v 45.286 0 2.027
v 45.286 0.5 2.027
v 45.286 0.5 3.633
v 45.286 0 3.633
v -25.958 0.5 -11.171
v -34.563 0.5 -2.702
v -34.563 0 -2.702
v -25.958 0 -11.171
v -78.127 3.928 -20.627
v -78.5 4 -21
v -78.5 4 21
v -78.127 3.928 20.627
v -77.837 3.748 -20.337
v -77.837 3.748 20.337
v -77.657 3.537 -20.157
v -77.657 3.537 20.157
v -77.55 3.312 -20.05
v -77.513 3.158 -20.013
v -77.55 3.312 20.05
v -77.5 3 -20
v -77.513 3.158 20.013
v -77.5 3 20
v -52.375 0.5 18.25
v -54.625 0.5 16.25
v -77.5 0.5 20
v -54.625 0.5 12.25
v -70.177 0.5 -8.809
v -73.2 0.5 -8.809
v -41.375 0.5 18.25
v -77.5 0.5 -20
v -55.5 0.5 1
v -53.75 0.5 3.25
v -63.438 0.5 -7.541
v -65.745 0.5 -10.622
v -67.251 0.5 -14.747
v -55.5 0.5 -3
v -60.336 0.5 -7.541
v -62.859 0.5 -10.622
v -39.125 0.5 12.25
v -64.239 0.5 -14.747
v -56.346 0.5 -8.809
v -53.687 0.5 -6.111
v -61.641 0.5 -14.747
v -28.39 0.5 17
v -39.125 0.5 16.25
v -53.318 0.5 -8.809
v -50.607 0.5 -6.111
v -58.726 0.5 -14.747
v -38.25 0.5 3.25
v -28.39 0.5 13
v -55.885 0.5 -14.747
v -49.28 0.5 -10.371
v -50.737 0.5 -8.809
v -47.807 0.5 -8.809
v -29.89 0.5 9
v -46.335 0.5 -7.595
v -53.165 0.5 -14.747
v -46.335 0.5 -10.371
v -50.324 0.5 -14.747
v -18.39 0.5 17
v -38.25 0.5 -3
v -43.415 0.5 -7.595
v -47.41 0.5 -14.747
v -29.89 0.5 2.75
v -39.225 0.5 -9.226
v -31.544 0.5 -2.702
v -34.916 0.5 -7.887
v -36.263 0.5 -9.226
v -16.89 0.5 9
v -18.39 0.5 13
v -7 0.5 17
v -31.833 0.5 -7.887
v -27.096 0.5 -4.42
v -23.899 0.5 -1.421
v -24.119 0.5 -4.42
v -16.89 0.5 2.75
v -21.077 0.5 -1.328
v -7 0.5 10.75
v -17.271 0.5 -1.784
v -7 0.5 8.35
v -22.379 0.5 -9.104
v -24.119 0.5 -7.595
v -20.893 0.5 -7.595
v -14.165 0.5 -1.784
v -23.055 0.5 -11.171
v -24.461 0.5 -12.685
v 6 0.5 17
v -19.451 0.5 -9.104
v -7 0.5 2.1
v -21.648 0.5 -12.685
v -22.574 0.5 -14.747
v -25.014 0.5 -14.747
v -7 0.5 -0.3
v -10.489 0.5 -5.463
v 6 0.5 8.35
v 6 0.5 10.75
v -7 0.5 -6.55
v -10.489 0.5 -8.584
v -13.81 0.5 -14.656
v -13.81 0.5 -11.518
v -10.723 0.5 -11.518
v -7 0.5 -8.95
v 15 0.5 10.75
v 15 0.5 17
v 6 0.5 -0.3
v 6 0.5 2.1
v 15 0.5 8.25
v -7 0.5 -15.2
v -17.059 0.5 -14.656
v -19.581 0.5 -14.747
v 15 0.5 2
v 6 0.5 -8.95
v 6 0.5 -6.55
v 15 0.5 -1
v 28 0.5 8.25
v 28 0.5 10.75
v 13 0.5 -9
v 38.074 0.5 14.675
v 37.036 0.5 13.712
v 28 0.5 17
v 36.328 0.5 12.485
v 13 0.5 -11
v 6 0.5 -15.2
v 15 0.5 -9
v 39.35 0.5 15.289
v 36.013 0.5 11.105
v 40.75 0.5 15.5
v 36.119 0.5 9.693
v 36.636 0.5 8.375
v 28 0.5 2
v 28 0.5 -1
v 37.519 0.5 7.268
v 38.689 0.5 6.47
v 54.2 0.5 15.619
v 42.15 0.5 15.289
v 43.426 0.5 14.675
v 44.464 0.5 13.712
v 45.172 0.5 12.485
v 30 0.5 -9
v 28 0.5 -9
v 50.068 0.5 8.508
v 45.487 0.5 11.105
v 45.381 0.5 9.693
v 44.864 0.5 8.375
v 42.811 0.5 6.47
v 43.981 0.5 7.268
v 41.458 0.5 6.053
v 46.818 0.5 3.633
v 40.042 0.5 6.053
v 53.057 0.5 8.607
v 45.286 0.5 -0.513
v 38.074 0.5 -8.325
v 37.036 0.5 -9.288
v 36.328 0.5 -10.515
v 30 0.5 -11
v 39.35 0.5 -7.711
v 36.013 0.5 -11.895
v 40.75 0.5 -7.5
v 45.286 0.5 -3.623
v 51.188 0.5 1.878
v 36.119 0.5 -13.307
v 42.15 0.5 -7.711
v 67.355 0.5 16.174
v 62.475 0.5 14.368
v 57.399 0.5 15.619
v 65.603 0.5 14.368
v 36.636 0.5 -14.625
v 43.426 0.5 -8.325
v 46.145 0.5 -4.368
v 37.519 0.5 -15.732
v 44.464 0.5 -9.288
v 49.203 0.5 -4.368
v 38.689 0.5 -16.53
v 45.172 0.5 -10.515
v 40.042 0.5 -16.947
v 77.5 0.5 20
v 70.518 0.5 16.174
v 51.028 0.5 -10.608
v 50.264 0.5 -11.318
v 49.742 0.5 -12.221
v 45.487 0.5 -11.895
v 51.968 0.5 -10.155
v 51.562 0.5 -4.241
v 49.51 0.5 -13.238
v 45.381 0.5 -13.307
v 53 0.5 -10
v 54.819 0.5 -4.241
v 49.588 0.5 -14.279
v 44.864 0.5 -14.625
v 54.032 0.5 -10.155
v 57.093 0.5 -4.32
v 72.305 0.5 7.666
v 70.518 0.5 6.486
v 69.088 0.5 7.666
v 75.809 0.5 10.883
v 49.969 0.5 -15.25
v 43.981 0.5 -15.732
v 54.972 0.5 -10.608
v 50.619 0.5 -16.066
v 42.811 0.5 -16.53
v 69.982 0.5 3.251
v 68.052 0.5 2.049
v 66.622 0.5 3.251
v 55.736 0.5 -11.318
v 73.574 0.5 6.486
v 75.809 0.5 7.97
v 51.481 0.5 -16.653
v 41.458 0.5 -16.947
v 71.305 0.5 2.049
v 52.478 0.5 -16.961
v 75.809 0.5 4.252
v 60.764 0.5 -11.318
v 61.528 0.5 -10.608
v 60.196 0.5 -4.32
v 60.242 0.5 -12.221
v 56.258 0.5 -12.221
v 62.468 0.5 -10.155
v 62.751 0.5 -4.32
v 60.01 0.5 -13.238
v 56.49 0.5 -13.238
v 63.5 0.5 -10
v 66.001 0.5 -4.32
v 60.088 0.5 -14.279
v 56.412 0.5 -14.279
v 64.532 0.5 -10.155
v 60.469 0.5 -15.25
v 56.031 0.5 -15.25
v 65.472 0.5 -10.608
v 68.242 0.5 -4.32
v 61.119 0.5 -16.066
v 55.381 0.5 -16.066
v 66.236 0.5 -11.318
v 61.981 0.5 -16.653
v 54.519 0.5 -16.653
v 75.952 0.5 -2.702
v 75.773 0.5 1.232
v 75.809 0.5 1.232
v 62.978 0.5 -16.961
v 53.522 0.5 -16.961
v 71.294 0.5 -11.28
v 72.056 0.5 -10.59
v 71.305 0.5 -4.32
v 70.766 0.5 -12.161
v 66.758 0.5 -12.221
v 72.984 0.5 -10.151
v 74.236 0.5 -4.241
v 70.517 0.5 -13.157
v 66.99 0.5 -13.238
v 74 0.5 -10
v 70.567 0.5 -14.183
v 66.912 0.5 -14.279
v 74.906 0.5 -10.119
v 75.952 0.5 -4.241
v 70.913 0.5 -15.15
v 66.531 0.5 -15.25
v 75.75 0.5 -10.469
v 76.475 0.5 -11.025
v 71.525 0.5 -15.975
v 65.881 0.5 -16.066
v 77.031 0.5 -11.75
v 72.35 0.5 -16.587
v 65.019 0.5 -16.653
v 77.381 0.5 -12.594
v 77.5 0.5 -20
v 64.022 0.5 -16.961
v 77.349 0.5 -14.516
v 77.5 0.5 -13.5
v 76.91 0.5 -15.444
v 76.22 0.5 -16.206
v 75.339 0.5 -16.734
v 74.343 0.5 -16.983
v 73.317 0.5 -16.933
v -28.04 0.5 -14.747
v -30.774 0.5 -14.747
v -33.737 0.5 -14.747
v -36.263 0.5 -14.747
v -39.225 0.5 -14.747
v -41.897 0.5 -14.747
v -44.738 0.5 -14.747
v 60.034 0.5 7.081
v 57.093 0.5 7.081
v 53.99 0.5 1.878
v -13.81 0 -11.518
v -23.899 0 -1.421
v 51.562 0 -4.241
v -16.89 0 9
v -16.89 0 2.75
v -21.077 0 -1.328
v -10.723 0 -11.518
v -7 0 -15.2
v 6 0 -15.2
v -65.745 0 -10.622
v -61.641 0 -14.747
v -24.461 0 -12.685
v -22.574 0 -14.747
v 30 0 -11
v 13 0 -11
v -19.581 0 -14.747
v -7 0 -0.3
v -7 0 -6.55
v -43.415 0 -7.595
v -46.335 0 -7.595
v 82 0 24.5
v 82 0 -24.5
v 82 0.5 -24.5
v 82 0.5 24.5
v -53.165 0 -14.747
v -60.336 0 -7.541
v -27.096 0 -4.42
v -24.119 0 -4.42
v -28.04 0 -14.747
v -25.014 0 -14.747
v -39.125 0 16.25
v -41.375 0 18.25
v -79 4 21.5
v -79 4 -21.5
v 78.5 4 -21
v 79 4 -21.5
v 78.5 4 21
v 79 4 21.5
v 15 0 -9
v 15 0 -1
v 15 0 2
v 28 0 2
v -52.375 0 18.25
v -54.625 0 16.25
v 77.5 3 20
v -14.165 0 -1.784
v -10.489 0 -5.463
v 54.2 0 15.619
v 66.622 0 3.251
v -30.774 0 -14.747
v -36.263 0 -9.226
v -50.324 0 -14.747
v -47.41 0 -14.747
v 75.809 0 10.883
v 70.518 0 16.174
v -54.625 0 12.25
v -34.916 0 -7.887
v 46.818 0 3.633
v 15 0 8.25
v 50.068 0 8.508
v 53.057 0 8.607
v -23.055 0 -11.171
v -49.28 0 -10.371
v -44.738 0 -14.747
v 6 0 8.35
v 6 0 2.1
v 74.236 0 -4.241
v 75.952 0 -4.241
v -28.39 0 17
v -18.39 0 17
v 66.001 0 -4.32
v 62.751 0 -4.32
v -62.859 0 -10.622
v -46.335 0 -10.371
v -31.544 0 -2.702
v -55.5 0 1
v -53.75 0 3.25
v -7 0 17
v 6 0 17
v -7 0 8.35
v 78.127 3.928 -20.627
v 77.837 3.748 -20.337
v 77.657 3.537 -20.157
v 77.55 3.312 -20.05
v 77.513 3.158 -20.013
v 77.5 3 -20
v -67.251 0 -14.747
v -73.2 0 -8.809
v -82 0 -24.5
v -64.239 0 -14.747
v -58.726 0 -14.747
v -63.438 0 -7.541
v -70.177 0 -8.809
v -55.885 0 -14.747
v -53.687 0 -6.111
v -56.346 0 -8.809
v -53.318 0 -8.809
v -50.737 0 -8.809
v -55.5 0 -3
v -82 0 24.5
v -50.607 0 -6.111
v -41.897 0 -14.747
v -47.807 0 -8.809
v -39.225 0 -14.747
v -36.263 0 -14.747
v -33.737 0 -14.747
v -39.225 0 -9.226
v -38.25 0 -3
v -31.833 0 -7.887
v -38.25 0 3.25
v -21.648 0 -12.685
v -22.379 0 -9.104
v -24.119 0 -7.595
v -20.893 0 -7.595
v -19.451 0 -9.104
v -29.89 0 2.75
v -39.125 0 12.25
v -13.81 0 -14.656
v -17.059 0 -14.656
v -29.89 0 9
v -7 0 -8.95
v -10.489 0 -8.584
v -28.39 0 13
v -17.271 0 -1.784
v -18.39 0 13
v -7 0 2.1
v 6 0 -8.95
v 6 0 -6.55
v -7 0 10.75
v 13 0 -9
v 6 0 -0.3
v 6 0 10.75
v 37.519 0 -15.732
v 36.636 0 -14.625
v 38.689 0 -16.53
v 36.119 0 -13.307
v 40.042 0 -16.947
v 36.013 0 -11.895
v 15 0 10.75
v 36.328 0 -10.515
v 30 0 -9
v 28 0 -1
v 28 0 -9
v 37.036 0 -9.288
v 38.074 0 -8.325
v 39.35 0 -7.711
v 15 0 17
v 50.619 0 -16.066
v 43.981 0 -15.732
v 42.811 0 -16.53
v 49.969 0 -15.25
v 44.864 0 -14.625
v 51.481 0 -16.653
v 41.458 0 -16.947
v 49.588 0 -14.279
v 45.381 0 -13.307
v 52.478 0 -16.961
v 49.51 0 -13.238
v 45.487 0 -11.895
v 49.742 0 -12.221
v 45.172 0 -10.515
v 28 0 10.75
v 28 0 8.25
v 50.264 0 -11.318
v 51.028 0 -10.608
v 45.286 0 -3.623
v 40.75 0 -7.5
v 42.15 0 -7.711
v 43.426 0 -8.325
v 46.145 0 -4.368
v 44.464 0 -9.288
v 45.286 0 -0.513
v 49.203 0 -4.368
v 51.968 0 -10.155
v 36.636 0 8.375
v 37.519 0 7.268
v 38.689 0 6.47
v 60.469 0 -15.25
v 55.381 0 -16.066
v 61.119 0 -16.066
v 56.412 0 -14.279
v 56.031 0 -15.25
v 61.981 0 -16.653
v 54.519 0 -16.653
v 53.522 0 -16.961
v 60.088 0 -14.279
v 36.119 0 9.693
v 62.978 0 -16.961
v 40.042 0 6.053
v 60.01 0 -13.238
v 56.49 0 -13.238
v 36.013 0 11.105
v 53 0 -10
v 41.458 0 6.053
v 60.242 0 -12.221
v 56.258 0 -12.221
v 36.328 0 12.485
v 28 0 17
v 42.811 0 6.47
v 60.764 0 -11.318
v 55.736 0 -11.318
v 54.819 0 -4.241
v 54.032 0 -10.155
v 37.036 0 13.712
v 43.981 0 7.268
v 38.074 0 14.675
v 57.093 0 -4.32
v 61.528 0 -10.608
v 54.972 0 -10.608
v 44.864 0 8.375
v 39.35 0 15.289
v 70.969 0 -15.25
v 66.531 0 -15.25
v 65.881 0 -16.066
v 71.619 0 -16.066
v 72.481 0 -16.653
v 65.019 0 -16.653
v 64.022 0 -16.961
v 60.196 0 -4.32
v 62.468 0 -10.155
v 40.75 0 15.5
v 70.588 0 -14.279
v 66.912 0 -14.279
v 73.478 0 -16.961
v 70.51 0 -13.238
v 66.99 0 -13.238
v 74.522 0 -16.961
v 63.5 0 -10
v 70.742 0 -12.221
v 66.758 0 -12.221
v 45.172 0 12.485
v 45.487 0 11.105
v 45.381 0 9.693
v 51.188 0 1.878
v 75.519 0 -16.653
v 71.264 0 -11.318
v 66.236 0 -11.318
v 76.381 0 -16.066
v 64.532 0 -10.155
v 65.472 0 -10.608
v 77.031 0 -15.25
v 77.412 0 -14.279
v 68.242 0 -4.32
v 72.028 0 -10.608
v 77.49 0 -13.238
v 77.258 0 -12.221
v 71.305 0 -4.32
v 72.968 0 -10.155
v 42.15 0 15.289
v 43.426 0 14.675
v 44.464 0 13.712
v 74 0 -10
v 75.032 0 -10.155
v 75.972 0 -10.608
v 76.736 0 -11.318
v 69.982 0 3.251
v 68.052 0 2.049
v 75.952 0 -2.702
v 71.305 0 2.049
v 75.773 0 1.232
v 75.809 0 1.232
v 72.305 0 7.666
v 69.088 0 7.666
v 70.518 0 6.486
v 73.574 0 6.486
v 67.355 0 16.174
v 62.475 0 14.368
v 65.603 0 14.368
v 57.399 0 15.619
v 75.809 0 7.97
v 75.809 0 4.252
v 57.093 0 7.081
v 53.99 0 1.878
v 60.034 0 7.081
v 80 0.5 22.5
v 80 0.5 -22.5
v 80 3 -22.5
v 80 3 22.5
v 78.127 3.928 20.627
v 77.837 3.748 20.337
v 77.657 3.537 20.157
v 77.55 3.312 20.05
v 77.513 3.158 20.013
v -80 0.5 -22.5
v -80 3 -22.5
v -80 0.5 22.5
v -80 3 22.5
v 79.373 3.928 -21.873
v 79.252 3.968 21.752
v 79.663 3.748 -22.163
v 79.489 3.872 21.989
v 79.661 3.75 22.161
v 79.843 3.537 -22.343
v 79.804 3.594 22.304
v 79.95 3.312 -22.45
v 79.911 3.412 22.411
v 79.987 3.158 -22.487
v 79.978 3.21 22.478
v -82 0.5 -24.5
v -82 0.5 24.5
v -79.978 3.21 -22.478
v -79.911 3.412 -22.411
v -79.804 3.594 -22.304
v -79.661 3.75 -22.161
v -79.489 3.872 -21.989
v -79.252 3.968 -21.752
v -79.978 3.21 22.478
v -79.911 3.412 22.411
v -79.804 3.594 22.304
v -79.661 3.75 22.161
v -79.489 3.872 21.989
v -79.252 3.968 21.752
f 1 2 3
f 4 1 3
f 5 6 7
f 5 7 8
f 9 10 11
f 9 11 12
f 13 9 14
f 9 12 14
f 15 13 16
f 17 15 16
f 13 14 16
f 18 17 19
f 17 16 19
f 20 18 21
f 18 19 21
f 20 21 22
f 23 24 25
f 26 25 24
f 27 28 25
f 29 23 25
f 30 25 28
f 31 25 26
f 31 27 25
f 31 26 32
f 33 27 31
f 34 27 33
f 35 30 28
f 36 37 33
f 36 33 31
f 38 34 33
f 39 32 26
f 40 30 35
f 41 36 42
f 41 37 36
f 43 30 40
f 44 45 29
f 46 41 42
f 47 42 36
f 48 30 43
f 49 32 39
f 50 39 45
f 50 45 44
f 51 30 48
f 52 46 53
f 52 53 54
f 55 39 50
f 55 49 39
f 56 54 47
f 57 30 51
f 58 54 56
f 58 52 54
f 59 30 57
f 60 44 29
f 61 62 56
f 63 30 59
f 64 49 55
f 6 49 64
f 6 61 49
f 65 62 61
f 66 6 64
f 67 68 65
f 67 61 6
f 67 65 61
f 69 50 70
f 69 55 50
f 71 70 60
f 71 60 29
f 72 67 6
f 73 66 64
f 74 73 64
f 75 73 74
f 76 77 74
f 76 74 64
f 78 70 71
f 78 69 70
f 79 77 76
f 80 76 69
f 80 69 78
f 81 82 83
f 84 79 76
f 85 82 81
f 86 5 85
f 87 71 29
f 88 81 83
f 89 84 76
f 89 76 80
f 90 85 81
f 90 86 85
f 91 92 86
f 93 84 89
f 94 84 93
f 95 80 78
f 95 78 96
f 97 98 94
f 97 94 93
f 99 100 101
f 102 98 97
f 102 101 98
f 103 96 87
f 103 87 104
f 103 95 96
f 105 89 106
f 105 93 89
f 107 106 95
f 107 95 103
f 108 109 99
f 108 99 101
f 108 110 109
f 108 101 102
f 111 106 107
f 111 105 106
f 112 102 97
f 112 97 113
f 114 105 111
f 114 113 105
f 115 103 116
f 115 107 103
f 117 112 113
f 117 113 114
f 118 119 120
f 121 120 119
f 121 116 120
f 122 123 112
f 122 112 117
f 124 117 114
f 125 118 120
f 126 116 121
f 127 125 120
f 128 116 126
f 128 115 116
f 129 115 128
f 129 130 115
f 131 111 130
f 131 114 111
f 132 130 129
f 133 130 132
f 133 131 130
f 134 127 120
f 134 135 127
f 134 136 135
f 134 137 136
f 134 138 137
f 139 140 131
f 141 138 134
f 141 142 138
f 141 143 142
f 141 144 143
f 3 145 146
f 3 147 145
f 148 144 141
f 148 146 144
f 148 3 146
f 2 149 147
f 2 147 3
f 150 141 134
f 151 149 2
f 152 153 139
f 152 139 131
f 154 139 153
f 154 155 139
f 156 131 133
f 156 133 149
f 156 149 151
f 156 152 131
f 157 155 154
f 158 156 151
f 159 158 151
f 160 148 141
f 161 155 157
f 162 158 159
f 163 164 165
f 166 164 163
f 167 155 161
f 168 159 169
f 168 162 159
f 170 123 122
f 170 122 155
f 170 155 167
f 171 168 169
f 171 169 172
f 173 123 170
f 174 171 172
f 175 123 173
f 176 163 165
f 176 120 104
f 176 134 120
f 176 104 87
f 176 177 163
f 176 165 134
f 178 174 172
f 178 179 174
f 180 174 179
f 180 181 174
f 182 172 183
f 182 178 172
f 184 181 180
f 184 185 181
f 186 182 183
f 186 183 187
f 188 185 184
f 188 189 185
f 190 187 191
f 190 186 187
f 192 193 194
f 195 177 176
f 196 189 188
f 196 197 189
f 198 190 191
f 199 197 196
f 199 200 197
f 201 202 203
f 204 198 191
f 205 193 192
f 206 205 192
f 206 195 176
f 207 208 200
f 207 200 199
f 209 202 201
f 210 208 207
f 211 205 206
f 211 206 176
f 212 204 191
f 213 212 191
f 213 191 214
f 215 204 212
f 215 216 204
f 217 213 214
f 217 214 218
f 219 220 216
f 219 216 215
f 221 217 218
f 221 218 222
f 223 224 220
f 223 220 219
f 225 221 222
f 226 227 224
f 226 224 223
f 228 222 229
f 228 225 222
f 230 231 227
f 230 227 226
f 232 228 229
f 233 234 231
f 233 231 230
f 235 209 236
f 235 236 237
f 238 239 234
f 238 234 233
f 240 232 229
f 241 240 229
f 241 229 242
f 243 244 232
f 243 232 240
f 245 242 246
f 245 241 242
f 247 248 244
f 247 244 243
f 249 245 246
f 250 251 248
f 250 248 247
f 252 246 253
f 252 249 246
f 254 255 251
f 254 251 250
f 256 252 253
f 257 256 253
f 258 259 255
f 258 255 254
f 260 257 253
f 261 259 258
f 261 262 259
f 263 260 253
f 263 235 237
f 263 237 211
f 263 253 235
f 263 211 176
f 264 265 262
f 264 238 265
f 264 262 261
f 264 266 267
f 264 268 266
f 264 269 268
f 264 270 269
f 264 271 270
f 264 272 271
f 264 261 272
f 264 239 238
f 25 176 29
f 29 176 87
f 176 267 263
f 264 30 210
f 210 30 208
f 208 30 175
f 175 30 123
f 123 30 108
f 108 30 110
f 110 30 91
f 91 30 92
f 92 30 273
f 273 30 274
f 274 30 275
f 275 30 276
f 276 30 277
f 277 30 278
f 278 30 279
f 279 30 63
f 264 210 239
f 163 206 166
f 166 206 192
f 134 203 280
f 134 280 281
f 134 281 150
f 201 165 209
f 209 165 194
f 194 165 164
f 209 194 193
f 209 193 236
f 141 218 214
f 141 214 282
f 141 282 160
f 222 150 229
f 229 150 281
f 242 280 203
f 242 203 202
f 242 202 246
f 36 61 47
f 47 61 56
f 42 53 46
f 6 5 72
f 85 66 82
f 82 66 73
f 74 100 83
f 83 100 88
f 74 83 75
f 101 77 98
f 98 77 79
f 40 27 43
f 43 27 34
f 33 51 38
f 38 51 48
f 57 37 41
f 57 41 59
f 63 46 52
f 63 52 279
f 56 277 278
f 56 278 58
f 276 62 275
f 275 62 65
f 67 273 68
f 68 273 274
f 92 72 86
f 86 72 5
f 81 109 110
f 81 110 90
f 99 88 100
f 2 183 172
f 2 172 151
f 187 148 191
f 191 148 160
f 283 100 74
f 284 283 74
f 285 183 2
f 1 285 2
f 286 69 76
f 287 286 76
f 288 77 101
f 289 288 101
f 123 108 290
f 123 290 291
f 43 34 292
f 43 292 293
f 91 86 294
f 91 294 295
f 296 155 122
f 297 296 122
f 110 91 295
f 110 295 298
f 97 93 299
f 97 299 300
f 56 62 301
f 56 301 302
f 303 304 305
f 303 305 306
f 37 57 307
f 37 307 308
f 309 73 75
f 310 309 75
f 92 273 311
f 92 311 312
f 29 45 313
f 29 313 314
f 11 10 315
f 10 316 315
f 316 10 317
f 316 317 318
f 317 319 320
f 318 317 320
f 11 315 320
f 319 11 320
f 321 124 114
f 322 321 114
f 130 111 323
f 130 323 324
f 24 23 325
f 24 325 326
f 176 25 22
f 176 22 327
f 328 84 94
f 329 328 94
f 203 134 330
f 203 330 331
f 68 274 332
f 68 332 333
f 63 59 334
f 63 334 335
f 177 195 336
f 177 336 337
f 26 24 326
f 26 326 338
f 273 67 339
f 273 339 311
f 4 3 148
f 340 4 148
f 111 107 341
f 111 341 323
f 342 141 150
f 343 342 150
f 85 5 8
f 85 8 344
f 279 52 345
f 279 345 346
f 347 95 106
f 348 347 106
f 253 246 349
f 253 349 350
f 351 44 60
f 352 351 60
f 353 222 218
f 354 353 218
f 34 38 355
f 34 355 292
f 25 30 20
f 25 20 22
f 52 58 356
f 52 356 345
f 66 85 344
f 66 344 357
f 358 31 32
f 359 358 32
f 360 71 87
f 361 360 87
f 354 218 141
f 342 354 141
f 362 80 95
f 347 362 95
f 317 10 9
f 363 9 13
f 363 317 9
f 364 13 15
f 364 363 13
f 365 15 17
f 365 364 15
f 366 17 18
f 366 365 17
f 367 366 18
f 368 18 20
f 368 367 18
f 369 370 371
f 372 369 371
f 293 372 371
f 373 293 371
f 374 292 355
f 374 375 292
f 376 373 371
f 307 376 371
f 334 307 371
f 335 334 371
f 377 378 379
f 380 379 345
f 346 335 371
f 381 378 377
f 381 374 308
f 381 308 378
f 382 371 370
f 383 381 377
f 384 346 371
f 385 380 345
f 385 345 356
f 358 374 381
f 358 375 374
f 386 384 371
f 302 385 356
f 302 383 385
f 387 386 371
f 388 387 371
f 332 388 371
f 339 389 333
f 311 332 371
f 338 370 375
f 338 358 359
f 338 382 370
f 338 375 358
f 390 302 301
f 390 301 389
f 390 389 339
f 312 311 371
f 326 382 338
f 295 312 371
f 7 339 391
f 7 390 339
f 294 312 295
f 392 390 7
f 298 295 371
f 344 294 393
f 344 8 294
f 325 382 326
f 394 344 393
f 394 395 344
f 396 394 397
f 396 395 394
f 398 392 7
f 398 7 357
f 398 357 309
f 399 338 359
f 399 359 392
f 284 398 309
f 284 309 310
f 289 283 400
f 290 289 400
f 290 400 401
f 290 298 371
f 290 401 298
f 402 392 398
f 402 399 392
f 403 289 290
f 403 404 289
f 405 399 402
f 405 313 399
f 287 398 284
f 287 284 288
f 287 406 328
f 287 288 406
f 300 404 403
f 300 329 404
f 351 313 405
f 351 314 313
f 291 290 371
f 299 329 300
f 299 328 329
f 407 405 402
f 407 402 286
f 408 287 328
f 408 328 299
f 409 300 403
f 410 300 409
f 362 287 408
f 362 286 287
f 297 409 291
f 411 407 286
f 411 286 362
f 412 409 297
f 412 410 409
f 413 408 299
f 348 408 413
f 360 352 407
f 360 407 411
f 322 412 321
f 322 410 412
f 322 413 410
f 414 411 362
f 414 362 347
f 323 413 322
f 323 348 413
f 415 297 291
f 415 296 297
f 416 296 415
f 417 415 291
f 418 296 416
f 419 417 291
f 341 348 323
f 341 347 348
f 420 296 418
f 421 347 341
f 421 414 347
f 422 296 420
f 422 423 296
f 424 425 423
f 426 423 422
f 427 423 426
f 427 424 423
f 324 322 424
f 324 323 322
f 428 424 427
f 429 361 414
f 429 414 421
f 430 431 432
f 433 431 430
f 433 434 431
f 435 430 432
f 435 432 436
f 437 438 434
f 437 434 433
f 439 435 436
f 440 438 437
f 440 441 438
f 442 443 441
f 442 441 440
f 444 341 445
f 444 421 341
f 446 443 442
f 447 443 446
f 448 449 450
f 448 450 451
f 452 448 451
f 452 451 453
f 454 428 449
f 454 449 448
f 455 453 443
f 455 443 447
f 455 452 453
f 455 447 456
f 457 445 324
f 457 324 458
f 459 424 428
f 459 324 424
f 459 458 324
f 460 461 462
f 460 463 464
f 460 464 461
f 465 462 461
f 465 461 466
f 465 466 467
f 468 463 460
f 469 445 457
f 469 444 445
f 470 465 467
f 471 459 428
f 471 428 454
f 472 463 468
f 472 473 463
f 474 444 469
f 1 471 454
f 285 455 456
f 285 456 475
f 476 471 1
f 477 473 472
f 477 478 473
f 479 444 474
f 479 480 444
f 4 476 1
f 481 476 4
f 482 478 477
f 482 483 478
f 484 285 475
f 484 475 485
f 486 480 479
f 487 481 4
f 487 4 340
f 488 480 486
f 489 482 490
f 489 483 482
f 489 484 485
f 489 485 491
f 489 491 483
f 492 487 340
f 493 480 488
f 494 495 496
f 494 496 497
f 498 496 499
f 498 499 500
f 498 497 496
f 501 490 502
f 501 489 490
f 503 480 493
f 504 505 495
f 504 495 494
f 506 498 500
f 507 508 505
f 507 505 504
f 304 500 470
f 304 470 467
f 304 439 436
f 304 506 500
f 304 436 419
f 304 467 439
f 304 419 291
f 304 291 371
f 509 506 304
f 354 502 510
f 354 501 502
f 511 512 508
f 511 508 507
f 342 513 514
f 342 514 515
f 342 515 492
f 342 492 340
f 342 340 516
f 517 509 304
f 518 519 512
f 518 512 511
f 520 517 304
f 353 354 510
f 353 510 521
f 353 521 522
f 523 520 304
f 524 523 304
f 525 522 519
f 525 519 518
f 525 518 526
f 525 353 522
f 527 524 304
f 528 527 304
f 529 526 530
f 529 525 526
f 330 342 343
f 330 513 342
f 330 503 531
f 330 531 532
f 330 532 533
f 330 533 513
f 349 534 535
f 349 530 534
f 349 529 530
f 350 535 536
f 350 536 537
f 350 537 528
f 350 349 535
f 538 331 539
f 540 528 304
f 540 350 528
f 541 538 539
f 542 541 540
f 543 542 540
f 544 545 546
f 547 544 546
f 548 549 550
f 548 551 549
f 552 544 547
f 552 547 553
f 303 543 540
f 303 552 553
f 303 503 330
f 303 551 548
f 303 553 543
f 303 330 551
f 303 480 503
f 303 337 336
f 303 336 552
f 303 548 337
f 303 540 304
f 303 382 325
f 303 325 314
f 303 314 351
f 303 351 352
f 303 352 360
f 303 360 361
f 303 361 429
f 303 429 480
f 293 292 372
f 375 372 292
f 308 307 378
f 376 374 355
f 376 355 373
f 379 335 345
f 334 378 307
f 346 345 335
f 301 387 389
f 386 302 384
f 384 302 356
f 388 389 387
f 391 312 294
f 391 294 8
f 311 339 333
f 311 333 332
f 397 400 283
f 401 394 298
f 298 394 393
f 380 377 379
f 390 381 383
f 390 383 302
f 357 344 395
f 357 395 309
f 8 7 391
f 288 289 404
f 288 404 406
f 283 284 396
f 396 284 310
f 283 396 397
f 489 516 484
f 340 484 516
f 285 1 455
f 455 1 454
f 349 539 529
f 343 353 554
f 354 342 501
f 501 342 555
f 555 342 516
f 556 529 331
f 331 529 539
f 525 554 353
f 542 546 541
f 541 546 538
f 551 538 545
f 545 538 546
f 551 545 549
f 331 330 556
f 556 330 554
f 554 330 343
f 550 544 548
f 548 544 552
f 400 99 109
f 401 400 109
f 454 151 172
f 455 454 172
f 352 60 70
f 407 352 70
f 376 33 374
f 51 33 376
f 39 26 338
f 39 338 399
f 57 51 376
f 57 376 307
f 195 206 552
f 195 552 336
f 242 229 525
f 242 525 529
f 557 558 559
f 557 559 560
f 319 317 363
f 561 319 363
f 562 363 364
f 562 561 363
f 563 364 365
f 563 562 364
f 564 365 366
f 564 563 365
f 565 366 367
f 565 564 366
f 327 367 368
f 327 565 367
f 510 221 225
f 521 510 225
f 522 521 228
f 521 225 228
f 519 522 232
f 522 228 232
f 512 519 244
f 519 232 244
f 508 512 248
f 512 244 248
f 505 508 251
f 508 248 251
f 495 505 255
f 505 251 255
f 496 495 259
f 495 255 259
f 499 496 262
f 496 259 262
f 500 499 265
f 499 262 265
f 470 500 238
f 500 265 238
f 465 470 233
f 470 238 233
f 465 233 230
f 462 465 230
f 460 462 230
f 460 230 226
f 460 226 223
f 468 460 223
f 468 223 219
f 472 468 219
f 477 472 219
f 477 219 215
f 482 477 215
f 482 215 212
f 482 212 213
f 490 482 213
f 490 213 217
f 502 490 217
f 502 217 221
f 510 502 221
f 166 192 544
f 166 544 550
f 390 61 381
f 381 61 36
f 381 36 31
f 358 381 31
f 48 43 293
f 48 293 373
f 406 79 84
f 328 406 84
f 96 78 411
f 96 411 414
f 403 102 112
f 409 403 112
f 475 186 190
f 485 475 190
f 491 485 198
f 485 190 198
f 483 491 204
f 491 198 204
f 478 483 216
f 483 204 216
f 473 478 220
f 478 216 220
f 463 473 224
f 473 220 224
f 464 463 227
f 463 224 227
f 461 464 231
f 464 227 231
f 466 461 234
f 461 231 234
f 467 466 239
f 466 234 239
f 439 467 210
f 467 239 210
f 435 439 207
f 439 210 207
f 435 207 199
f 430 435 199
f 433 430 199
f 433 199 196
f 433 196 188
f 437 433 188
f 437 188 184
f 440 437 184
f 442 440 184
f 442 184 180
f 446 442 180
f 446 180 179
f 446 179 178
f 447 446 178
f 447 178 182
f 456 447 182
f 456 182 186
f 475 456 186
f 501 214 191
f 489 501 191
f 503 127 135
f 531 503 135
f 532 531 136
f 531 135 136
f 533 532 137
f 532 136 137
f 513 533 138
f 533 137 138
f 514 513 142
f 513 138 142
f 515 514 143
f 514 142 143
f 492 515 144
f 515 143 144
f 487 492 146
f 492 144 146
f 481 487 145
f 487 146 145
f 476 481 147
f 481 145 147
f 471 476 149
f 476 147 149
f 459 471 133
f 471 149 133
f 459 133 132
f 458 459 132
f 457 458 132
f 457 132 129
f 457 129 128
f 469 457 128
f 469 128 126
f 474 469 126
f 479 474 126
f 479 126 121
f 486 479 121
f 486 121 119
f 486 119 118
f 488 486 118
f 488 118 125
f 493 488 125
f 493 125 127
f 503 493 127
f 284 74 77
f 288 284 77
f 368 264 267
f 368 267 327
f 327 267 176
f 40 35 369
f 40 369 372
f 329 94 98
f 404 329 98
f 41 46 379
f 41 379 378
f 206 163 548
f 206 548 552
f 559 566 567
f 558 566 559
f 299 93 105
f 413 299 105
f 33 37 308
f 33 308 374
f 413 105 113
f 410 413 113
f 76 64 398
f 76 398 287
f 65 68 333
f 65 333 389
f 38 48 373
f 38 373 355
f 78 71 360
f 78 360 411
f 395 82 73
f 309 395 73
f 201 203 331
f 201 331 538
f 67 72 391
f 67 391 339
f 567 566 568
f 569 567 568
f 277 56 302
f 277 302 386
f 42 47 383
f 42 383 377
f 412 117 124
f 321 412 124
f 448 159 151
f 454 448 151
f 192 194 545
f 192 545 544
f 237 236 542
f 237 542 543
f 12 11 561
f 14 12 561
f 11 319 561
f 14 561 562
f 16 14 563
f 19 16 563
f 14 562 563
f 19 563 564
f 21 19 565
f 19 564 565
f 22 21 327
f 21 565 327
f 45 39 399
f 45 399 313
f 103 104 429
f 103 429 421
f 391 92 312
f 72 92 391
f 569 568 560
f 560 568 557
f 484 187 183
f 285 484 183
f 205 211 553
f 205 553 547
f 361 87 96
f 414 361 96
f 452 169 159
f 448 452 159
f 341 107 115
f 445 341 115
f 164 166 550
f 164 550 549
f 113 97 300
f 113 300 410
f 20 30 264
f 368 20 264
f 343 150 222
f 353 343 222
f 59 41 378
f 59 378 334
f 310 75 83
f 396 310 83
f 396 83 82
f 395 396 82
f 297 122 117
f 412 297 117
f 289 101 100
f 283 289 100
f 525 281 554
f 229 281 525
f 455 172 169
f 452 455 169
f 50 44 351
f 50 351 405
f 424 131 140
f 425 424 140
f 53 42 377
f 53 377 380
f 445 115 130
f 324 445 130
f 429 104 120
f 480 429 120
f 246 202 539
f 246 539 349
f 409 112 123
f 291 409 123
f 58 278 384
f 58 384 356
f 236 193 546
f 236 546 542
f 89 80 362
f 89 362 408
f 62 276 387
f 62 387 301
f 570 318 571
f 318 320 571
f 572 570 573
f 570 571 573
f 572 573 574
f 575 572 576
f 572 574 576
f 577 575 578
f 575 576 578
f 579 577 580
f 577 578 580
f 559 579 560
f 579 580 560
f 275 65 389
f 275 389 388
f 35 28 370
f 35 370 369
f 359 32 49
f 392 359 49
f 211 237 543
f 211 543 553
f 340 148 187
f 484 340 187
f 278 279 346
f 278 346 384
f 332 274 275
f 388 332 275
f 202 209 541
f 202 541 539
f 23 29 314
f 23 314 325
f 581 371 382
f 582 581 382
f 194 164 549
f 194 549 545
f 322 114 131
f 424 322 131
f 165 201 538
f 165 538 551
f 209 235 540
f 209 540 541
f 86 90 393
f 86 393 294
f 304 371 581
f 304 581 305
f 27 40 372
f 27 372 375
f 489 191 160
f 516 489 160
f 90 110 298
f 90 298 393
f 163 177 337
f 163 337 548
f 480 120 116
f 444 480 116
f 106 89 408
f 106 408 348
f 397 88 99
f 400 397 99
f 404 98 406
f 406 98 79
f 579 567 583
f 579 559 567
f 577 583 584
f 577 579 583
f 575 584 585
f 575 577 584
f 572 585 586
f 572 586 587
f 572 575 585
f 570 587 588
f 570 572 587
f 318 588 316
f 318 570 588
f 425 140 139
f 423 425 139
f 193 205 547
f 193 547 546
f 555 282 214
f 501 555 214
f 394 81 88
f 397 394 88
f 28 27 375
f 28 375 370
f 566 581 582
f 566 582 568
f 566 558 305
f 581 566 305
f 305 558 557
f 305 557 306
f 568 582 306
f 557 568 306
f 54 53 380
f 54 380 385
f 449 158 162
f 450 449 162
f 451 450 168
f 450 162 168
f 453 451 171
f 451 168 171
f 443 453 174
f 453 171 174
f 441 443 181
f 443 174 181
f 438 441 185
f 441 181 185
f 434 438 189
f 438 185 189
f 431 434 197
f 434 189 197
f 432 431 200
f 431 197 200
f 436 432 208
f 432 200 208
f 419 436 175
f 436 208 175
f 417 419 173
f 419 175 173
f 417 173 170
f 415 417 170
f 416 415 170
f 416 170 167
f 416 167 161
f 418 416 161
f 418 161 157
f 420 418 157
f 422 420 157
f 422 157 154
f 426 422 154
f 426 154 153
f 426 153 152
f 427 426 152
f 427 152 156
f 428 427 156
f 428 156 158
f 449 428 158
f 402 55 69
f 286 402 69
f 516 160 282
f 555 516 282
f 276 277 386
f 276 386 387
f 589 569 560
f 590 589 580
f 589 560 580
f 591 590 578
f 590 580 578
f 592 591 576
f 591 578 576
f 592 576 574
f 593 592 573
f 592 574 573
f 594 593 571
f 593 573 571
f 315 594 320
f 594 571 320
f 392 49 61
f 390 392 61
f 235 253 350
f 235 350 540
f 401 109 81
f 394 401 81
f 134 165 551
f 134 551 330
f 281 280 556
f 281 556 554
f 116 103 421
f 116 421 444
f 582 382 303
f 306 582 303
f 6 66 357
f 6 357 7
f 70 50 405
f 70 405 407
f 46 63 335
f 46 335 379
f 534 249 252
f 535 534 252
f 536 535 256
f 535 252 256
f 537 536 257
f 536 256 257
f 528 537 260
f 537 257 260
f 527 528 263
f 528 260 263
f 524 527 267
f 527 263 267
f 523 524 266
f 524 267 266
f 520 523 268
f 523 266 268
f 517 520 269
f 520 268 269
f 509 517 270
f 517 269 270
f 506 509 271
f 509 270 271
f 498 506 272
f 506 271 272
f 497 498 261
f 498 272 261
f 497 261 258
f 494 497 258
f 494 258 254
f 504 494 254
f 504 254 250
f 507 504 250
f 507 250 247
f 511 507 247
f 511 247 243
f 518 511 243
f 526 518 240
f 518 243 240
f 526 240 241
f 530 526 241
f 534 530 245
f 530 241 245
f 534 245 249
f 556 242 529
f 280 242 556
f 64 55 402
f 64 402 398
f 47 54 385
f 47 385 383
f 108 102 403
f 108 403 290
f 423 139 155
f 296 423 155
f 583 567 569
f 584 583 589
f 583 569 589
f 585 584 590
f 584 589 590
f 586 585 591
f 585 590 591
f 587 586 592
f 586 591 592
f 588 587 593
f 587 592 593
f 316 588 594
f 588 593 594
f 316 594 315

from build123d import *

# Parameters (mm, degrees)
SKETCH1_W           = 155
SKETCH1_H           = 40
BOSS_EXTRUDE1_DEPTH = 0.5
SKETCH2_W           = 160
SKETCH2_H           = 45
SKETCH2_W_2         = 155
SKETCH2_H_2         = 40
BOSS_EXTRUDE2_DEPTH = 4
FILLET1_R           = 1
SKETCH3_W           = 164
SKETCH3_H           = 49
BOSS_EXTRUDE3_DEPTH = 0.5
SKETCH5_R           = 3.5
SKETCH5_R_2         = 4.75
SKETCH5_W           = 13
SKETCH5_H           = 6.25
SKETCH5_W_2         = 10
SKETCH5_H_2         = 4
CUT_EXTRUDE1_DEPTH  = 86.653371212
CUT_EXTRUDE2_DEPTH  = 86.653371212


with BuildPart() as part:
    # Sketch1 → Boss-Extrude1 (new body)
    with BuildSketch(Plane(origin=(0, 0, 0), x_dir=(1, 0, 0), z_dir=(0, 1, 0))):
        Rectangle(SKETCH1_W, SKETCH1_H)
    extrude(amount=BOSS_EXTRUDE1_DEPTH)

    # Sketch2 → Boss-Extrude2 (add)
    with BuildSketch(Plane.XZ):
        Rectangle(SKETCH2_W, SKETCH2_H)
        Rectangle(SKETCH2_W_2, SKETCH2_H_2, mode=Mode.SUBTRACT)
    extrude(amount=-BOSS_EXTRUDE2_DEPTH)

    # Fillet1
    fillet1_edges = [part.edges().sort_by_distance(p)[0] for p in [
        (-80, 4, 0),
        (0, 4, 22.5),
        (80, 4, 0),
        (0, 4, -22.5),
        (77.5, 4, 0),
        (0, 4, 20),
        (-77.5, 4, 0),
        (0, 4, -20),
    ]]
    fillet(fillet1_edges, radius=FILLET1_R)

    # Sketch3 → Boss-Extrude3 (add)
    with BuildSketch(Plane.XZ):
        Rectangle(SKETCH3_W, SKETCH3_H)
    extrude(amount=-BOSS_EXTRUDE3_DEPTH)

    # Sketch5 → Cut-Extrude1 (cut, through all)
    with BuildSketch(Plane(origin=(0, 0.5, 0), x_dir=(1, 0, 0), z_dir=(0, 1, 0))):
        with Locations(Location((74, 13.5, 0), (0, 0, 270))):
            Circle(SKETCH5_R)
        with Locations(Location((63.5, 13.5, 0), (0, 0, 270))):
            Circle(SKETCH5_R)
        with Locations(Location((53, 13.5, 0), (0, 0, 270))):
            Circle(SKETCH5_R)
        with Locations(Location((40.75, 12.25, 0), (0, 0, 270))):
            Circle(SKETCH5_R_2)
        with Locations(Location((40.75, -10.75, 0), (0, 0, 270))):
            Circle(SKETCH5_R_2)
        with Locations((21.5, -13.875)):
            Rectangle(SKETCH5_W, SKETCH5_H)
        with Locations((21.5, -5.125)):
            Rectangle(SKETCH5_W, SKETCH5_H)
        Polygon((13, 11), (13, 9), (15, 9), (15, 1), (28, 1), (28, 9), (30, 9), (30, 11), align=None)
        with Locations((-0.5, -13.875)):
            Rectangle(SKETCH5_W, SKETCH5_H)
        with Locations((-0.5, -5.225)):
            Rectangle(SKETCH5_W, SKETCH5_H)
        with Locations((-0.5, 3.425)):
            Rectangle(SKETCH5_W, SKETCH5_H)
        with Locations((-0.5, 12.075)):
            Rectangle(SKETCH5_W, SKETCH5_H)
        with Locations((-23.389803957, -5.875)):
            Rectangle(SKETCH5_W, SKETCH5_H)
        with Locations((-23.389803957, -15)):
            Rectangle(SKETCH5_W_2, SKETCH5_H_2)
        Polygon((-55.5, 3), (-55.5, -1), (-53.75, -3.25), (-38.25, -3.25), (-38.25, 3), align=None)
        Polygon((-39.125, -12.25), (-39.125, -16.25), (-41.375, -18.25), (-52.375, -18.25), (-54.625, -16.25), (-54.625, -12.25), align=None)
    extrude(amount=-CUT_EXTRUDE1_DEPTH, mode=Mode.SUBTRACT)

    # Sketch7 → Cut-Extrude2 (cut, through all)
    with BuildSketch(Plane(origin=(0, 0.5, 0), x_dir=(1, 0, 0), z_dir=(0, 1, 0))):
        Polygon((-67.250510445, 14.746570529), (-64.239153938, 14.746570529), (-70.176868986, 8.808855481), (-73.200368059, 8.808855481), align=None)
        Polygon((-61.640644694, 14.746570529), (-58.726428719, 14.746570529), (-62.859039574, 10.622393574), (-65.744832191, 10.622393574), align=None)
        Polygon((-55.885068144, 14.746570529), (-53.165133234, 14.746570529), (-60.336027284, 7.540750618), (-63.437744545, 7.540750618), align=None)
        Polygon((-50.323772659, 14.746570529), (-47.409556685, 14.746570529), (-53.318492244, 8.808855481), (-56.346485673, 8.808855481), align=None)
        Polygon((-44.738192041, 14.746570529), (-41.896831466, 14.746570529), (-46.335248567, 10.37079238), (-49.279511935, 10.37079238), align=None)
        Polygon((-50.736619922, 8.808855481), (-47.807380251, 8.808855481), (-50.607399688, 6.110903309), (-53.686609439, 6.110903309), align=None)
        Polygon((-39.225466823, 14.746570529), (-36.262680582, 14.746570529), (-43.414652286, 7.594598825), (-46.335248567, 7.594598825), align=None)
        Polygon((-33.567030806, 14.746570529), (-30.774240497, 14.746570529), (-36.262680582, 9.225561643), (-39.225466823, 9.225561643), (-33.737026738, 14.746570529), align=None)
        Polygon((-28.039824293, 14.746570529), (-25.014130416, 14.746570529), (-31.833017792, 7.887219381), (-34.916396501, 7.887219381), align=None)
        Polygon((-22.574054709, 14.746570529), (-19.580895175, 14.746570529), (-21.648041016, 12.684601459), (-24.461046589, 12.684601459), align=None)
        Polygon((-25.957626356, 11.170584677), (-23.054543803, 11.170584677), (-31.544128494, 2.702260527), (-34.562960016, 2.702260527), align=None)
        Polygon((-27.096328353, 4.41957859), (-24.11943599, 4.41957859), (-20.893046917, 7.594598825), (-24.11943599, 7.594598825), align=None)
        Polygon((-22.378761422, 9.104350792), (-19.450757804, 9.104350792), (-13.809696196, 14.65559844), (-17.059483611, 14.65559844), align=None)
        Polygon((-23.898512836, 1.421313419), (-21.077474942, 1.328401476), (-10.722527867, 11.518482635), (-13.809696196, 11.518482635), align=None)
        Polygon((-17.270956838, 1.784296826), (-14.164624085, 1.784296826), (-10.489423725, 5.462539901), (-10.489423725, 8.583974463), align=None)
        Polygon((45.285967662, 3.623418363), (45.285967662, 0.513302694), (49.202811749, 4.367784889), (46.145186604, 4.367784889), align=None)
        Polygon((45.285967662, -2.026996785), (45.285967662, -3.633362633), (46.817618819, -3.633362633), (54.819393397, 4.241011979), (51.562001671, 4.241011979), align=None)
        Polygon((51.188428218, -1.877567404), (53.990229114, -1.877567404), (60.195561112, 4.319829757), (57.092895113, 4.319829757), align=None)
        Polygon((50.067707859, -8.508496193), (53.057358815, -8.606961469), (66.000700856, 4.319829757), (62.750526584, 4.319829757), align=None)
        Polygon((68.242056341, 4.319829757), (71.305358655, 4.319829757), (60.033658541, -7.081188124), (57.092895113, -7.081188124), align=None)
        Polygon((74.235786126, 4.241011979), (75.951599175, 4.241011979), (75.951599175, 2.702260527), (71.305358655, -2.048937359), (68.051709926, -2.048937359), align=None)
        Polygon((75.808614755, -1.231673392), (75.808614755, -4.252219282), (73.574483179, -6.486350857), (70.518191185, -6.486350857), (75.772868649, -1.231673392), align=None)
        Polygon((75.808614755, -7.969814223), (75.808614755, -10.883121797), (70.518191185, -16.173545367), (67.354660874, -16.173545367), align=None)
        Polygon((69.088346976, -7.665972329), (72.305496445, -7.665972329), (65.603005834, -14.36846294), (62.475317514, -14.36846294), align=None)
        Polygon((66.621865717, -3.251328336), (69.981999606, -3.251328336), (57.399370575, -15.619480737), (54.200094159, -15.619480737), align=None)
    extrude(amount=-CUT_EXTRUDE2_DEPTH, mode=Mode.SUBTRACT)


solid = part.part
